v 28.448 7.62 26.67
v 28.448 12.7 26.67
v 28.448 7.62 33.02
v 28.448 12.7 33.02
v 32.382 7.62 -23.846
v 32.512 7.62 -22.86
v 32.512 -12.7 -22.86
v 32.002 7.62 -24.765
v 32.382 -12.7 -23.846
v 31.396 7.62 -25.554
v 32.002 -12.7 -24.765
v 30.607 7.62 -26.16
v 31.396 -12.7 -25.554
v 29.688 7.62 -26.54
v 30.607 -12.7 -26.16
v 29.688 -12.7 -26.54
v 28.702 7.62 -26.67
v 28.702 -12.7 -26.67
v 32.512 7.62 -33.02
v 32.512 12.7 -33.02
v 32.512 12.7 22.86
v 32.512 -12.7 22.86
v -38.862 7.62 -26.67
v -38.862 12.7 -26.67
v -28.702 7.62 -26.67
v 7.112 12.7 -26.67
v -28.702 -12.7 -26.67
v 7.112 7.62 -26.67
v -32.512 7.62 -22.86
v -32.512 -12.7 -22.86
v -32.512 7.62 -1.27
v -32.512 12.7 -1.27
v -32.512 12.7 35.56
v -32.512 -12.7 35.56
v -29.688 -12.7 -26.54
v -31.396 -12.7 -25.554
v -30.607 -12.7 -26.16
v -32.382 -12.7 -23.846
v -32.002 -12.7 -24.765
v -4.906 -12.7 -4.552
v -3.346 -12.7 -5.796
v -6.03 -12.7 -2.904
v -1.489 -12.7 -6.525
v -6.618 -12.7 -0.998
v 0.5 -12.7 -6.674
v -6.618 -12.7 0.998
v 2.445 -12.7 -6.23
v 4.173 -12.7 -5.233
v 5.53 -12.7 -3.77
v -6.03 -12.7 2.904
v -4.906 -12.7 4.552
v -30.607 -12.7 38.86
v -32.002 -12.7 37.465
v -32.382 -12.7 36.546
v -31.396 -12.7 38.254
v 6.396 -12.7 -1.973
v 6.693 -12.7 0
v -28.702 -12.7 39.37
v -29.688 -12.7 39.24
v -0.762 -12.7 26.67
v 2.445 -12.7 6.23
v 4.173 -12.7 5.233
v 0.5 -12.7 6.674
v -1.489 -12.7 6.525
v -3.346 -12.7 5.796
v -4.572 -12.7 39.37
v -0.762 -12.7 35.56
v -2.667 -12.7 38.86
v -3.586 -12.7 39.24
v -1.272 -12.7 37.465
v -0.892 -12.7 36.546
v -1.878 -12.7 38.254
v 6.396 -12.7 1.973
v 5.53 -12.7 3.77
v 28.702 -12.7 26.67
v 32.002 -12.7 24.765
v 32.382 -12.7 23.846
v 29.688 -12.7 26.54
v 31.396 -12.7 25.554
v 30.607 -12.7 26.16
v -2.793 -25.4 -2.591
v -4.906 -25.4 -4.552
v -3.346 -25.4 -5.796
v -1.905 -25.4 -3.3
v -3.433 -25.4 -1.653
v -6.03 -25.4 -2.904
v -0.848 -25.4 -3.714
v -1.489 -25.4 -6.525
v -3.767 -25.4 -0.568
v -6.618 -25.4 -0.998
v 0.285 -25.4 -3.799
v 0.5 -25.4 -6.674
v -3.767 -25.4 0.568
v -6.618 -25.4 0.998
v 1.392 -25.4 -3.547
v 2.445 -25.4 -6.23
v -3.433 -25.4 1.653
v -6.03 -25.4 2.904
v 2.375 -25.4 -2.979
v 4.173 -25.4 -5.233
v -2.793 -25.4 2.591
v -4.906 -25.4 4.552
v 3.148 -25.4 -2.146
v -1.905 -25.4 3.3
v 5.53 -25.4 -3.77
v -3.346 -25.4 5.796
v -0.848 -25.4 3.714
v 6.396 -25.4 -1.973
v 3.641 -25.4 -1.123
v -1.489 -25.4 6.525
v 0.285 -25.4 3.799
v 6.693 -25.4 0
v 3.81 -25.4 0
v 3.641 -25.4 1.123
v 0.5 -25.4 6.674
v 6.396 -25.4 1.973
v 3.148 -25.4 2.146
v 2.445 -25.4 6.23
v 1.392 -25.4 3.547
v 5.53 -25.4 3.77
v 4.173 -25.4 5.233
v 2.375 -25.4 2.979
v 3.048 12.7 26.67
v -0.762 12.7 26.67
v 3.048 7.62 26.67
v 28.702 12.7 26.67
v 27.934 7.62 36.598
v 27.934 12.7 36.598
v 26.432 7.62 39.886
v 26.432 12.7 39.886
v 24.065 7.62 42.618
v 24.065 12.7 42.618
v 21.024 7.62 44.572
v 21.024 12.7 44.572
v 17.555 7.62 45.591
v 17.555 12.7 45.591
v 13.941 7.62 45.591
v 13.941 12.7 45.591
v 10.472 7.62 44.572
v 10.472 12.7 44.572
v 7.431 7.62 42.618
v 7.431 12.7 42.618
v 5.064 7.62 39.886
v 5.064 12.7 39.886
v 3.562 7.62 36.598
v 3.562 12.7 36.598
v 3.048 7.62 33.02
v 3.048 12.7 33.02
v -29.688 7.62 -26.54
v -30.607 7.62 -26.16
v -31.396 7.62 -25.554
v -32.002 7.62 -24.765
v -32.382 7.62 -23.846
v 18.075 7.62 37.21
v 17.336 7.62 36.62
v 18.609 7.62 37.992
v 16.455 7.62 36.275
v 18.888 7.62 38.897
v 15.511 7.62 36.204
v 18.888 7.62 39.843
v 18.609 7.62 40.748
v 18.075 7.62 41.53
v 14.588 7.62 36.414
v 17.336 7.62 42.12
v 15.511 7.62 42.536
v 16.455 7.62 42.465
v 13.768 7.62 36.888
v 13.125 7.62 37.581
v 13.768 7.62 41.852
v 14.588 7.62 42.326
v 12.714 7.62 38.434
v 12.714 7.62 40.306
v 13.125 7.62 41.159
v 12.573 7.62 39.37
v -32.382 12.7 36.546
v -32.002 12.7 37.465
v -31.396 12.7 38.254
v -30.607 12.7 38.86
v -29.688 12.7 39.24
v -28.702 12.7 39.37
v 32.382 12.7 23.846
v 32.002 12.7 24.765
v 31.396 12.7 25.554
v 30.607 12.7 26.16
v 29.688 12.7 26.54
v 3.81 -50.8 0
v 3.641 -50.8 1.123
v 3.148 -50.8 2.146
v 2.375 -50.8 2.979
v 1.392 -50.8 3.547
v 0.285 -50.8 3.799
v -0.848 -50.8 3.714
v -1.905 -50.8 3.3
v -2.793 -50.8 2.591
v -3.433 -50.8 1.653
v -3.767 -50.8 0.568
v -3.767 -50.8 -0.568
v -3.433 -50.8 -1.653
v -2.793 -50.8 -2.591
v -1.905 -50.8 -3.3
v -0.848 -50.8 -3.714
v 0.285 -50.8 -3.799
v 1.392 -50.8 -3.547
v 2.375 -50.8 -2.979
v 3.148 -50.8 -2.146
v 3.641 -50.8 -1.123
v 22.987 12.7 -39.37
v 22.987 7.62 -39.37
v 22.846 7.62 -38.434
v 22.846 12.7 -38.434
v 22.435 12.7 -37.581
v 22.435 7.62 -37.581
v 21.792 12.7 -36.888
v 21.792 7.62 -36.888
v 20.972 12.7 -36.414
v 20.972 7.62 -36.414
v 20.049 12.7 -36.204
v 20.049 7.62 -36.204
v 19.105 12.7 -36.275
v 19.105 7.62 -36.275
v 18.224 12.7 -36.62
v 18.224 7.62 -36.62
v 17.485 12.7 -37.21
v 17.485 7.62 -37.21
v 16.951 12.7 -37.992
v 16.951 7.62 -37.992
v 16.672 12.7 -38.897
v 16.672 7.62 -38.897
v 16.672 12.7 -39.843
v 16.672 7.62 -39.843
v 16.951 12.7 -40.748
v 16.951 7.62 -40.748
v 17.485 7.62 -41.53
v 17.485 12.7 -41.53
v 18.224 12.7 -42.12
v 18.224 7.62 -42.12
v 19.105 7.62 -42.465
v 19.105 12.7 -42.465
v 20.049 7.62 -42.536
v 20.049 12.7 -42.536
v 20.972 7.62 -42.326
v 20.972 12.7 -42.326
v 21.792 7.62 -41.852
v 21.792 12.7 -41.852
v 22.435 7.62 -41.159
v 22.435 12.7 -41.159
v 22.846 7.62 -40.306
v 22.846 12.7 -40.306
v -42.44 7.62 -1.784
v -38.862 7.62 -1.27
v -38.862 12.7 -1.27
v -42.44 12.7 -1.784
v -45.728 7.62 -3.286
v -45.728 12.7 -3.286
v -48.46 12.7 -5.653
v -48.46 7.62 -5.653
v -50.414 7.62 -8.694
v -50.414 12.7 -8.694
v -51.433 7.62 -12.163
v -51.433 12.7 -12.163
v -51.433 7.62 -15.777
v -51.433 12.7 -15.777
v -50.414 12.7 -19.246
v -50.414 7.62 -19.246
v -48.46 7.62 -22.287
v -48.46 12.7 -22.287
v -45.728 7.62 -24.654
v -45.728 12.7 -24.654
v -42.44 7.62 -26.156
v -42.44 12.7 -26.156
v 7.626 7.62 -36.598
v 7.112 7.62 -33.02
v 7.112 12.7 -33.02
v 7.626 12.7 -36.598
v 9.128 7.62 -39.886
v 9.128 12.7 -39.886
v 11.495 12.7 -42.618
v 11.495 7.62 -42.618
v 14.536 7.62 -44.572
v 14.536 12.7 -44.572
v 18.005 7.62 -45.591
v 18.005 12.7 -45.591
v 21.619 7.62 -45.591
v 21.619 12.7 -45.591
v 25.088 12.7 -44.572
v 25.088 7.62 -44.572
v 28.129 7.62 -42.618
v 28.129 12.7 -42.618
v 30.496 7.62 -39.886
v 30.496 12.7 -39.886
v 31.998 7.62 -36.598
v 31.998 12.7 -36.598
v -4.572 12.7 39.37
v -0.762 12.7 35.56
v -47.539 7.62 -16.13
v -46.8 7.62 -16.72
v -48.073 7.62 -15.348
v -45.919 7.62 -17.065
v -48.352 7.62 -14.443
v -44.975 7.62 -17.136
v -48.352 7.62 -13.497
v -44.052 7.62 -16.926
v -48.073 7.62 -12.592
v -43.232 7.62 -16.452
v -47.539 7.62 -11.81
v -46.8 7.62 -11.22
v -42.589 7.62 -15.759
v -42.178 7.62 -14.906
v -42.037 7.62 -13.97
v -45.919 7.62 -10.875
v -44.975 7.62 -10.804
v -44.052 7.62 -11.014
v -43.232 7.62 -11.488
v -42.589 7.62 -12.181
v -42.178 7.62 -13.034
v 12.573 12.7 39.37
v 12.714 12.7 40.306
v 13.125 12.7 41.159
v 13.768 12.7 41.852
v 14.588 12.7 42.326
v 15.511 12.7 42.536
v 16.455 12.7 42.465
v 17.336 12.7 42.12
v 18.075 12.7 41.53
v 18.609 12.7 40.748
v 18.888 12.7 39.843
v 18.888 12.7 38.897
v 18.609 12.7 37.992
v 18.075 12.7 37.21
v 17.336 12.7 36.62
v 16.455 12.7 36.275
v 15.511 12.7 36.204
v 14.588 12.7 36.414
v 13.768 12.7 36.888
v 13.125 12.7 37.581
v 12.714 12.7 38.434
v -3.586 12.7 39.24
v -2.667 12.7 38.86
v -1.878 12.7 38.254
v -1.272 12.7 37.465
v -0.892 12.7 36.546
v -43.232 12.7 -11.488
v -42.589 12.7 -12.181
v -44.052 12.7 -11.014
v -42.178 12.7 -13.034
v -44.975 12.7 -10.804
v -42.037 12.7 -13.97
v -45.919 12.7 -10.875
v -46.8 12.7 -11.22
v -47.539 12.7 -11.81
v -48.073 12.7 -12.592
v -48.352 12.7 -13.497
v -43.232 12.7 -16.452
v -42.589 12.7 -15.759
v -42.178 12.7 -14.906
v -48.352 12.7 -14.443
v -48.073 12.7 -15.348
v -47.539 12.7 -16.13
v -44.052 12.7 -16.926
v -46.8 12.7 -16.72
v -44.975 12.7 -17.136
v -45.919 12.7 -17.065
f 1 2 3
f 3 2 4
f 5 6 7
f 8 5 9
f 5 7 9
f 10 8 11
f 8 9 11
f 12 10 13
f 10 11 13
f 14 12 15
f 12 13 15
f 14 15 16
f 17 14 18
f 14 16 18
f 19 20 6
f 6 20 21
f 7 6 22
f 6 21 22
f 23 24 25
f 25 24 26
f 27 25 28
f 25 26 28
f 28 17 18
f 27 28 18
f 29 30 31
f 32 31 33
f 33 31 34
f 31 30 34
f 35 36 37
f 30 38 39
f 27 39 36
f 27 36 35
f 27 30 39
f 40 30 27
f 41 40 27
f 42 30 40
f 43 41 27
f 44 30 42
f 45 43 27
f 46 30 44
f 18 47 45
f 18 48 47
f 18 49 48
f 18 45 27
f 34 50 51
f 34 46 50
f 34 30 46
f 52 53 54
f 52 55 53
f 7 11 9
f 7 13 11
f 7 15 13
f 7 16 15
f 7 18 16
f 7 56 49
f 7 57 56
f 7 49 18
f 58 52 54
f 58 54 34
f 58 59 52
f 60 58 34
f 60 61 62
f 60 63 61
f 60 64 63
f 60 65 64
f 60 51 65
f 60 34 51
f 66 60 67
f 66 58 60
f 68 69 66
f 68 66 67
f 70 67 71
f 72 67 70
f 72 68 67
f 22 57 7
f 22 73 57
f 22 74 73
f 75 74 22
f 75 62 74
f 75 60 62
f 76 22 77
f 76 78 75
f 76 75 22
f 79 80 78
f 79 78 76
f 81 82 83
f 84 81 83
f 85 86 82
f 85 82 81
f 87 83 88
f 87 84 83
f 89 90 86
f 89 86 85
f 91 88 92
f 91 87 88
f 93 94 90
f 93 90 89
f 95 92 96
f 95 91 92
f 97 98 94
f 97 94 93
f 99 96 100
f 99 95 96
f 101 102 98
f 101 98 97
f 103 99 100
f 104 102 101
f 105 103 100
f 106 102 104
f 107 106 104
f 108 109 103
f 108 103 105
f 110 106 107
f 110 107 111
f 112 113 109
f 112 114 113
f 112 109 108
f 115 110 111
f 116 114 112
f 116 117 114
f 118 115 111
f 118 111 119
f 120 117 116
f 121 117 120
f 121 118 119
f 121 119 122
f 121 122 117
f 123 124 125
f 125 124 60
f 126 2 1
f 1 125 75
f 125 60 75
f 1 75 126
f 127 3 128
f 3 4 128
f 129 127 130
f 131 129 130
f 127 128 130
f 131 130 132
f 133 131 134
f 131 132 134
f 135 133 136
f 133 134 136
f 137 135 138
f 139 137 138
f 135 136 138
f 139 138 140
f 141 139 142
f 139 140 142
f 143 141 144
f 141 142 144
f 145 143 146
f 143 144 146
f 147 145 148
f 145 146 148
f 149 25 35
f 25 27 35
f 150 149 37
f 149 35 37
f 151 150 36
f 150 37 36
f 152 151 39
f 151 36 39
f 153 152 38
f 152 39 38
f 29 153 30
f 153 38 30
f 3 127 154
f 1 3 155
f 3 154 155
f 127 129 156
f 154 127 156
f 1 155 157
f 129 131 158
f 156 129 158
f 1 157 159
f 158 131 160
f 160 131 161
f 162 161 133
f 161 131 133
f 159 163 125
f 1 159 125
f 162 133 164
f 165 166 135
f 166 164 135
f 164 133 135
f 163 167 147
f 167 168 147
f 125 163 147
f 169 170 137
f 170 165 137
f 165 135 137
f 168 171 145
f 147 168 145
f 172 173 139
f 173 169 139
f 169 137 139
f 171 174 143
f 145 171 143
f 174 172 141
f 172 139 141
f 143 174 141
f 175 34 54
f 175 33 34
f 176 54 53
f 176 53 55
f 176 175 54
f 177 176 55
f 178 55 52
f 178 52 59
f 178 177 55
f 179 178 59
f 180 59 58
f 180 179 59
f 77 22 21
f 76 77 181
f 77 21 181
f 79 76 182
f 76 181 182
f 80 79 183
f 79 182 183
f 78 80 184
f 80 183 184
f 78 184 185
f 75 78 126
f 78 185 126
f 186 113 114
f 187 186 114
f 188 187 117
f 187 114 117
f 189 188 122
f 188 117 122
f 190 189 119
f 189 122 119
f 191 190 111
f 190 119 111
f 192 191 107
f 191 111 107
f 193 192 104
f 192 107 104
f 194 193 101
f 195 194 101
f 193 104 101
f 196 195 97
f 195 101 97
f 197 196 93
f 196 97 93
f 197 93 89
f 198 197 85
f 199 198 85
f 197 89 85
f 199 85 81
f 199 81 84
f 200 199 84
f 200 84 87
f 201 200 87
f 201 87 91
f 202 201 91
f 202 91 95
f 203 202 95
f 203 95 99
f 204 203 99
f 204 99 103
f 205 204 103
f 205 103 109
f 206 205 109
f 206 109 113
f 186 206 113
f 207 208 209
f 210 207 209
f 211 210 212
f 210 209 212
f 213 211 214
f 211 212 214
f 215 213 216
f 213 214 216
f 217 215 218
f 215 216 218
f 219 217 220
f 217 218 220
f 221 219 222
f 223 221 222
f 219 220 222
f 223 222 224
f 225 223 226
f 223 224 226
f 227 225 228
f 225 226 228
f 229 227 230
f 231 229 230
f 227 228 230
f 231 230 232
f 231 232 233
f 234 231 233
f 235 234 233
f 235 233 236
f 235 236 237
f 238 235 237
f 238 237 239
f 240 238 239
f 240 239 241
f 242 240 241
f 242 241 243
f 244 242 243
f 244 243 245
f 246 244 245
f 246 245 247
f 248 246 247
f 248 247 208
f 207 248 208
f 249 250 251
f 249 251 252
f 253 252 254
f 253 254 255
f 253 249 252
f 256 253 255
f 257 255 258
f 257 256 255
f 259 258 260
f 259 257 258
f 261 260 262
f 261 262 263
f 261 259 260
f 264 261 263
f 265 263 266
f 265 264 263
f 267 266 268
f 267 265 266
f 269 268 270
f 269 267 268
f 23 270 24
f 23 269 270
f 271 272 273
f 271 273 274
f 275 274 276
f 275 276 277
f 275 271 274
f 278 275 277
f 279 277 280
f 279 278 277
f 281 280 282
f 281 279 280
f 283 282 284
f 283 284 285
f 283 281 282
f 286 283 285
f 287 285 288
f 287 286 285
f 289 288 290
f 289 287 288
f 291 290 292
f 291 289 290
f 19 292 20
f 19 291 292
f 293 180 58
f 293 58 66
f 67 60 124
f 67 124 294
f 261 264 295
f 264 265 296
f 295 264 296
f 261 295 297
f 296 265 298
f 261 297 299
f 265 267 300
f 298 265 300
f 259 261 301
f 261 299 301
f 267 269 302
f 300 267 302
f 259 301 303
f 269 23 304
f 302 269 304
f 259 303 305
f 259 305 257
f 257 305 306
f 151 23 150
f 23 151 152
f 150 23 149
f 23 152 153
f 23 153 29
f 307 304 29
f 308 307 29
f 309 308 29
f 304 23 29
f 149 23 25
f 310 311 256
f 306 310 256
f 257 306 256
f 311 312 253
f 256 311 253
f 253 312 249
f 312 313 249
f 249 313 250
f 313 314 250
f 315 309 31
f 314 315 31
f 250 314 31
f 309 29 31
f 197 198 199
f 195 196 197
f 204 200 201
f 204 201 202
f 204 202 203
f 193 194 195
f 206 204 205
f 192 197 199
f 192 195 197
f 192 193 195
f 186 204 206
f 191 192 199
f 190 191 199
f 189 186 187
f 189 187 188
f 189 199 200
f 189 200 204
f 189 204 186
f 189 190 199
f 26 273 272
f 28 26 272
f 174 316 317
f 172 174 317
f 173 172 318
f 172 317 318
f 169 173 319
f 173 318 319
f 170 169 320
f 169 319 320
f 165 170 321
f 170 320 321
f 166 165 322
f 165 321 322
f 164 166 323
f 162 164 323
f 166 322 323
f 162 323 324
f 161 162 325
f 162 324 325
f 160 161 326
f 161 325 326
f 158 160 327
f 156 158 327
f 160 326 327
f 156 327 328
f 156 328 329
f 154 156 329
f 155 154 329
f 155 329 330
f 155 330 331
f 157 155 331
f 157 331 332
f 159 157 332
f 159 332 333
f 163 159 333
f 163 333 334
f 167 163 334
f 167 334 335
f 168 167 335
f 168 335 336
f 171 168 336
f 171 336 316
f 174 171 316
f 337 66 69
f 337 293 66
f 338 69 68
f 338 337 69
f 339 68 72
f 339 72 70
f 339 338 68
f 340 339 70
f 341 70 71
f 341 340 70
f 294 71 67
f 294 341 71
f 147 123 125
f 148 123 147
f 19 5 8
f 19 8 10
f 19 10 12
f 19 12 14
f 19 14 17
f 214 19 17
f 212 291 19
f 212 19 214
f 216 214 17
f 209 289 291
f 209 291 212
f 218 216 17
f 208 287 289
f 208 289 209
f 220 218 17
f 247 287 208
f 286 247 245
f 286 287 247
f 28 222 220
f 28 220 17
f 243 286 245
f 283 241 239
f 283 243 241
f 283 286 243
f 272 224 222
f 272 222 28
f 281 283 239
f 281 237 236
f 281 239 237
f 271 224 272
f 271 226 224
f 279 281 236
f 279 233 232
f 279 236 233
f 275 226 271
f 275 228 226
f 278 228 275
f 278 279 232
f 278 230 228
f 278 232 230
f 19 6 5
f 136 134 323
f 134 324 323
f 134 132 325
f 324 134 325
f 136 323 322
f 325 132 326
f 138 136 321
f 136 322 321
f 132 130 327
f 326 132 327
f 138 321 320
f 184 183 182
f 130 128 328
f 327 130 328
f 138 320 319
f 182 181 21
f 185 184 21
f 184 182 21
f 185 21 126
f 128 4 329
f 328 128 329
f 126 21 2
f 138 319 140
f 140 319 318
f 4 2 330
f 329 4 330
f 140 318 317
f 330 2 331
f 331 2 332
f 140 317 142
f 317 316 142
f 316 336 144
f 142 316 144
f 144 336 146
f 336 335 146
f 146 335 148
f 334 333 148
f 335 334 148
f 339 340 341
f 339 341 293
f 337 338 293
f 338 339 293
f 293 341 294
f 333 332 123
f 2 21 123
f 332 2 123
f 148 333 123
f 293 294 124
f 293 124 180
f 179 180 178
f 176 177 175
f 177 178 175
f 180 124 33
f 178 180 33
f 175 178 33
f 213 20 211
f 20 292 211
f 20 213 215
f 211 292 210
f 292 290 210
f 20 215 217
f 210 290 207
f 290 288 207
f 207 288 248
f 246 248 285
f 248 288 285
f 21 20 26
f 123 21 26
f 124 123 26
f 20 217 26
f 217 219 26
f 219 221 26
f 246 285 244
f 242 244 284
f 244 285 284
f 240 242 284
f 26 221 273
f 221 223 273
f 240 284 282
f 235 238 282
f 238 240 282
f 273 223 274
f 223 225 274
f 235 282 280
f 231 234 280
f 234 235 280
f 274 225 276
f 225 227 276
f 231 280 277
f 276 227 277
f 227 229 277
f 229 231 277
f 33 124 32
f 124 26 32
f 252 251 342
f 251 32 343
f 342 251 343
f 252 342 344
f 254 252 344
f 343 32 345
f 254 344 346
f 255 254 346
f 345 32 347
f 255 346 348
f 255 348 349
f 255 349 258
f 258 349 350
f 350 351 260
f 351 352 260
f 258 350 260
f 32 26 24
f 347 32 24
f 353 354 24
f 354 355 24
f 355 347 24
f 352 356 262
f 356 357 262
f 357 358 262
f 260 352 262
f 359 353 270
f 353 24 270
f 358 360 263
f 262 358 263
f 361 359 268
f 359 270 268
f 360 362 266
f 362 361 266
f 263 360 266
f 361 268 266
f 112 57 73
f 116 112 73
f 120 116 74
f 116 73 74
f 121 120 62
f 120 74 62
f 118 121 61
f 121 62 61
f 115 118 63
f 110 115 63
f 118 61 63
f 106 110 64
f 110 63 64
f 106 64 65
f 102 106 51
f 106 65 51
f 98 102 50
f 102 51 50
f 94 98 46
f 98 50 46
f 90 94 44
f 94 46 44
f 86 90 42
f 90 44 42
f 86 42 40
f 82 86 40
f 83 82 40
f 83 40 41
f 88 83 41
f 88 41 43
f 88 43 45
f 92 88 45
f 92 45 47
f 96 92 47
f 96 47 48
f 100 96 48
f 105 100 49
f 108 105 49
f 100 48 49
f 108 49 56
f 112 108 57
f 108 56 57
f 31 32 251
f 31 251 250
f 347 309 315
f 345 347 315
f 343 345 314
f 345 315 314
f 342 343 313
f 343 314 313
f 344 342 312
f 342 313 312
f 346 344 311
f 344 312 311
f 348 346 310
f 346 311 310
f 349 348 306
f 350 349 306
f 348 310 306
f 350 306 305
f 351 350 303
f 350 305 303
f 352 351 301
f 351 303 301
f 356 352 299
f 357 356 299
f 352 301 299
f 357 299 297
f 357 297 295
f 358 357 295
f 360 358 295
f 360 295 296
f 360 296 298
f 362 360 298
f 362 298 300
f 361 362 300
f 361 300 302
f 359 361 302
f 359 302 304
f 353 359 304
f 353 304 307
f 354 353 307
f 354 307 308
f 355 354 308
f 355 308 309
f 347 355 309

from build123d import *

# Parameters (mm, degrees)
F0_W          = 65.024
F0_H          = 53.34
F1_DEPTH      = 12.7
F1_DEPTH_BACK = 12.7
F2_W          = 31.75
F2_H          = 12.7
F3_DEPTH      = 25.4
F4_W          = 25.4
F4_H          = 6.35
F5_DEPTH      = 5.08
F7_W          = 12.7
F7_H          = 5.08
F8_ANGLE      = 180
F9_R          = 3.175
F10_DEPTH     = 25.4
F11_W         = 5.08
F11_H         = 25.4
F12_DEPTH     = 6.35
F13_W         = 5.08
F13_H         = 12.7
F15_R         = 3.175
F16_DEPTH     = 25.4
F17_W         = 25.4
F17_H         = 5.08
F18_DEPTH     = 6.35
F19_W         = 12.7
F19_H         = 5.08
F21_R         = 3.175
F22_DEPTH     = 25.4
F23_R         = 3.81
F24_R         = 6.6929
F24_R_2       = 2.54
F25_DEPTH     = 12.7
F26_R         = 3.81
F27_DEPTH     = 38.1


with BuildPart() as f1:
    # F0 (on Front) → F1 (new body, two sides)
    with BuildSketch(Plane.XZ) as f1_sk:
        Rectangle(F0_W, F0_H)
    extrude(amount=F1_DEPTH)
    extrude(f1_sk.sketch, amount=-F1_DEPTH_BACK)

    # F2 (on face) → F3 (join)
    with BuildSketch(Plane.XZ.offset(12.7)):
        with Locations((-16.637, 33.02)):
            Rectangle(F2_W, F2_H)
    extrude(amount=-F3_DEPTH)

    # F4 (on face) → F5 (join)
    with BuildSketch(Plane(origin=(0, 12.7, 0), x_dir=(-1, 0, 0), z_dir=(0, 1, 0))):
        with Locations((-15.748, 29.845)):
            Rectangle(F4_W, F4_H)
    extrude(amount=-F5_DEPTH)

    # F7 (on face) → F8 (revolve)
    with BuildSketch(Plane.XY.offset(33.02)):
        with Locations((22.098, 10.16)):
            Rectangle(F7_W, F7_H)
    revolve(axis=Axis((15.748, 10.16, 33.02), (0, -1, 0)), revolution_arc=F8_ANGLE)

    # F9 (on face) → F10 (cut)
    with BuildSketch(Plane(origin=(0, 12.7, 0), x_dir=(-1, 0, 0), z_dir=(0, 1, 0))):
        with Locations((-15.748, 39.37)):
            Circle(F9_R)
    extrude(amount=-F10_DEPTH, mode=Mode.SUBTRACT)

    # F11 (on face) → F12 (join)
    with BuildSketch(Plane(origin=(-32.512, 0, 0), x_dir=(0, -1, 0), z_dir=(-1, 0, 0))):
        with Locations((-10.16, -13.97)):
            Rectangle(F11_W, F11_H)
    extrude(amount=F12_DEPTH)

    # F13 (on face) → F14 (revolve)
    with BuildSketch(Plane(origin=(-38.862, 0, 0), x_dir=(0, -1, 0), z_dir=(-1, 0, 0))):
        with Locations((-10.16, -7.62)):
            Rectangle(F13_W, F13_H)
    revolve(axis=Axis((-38.862, 10.16, -13.97), (0, -1, 0)))

    # F15 (on face) → F16 (cut)
    with BuildSketch(Plane.XZ.offset(-7.62)):
        with Locations((-45.212, -13.97)):
            Circle(F15_R)
    extrude(amount=-F16_DEPTH, mode=Mode.SUBTRACT)

    # F17 (on face) → F18 (join)
    with BuildSketch(Plane(origin=(0, 0, -26.67), x_dir=(1, 0, 0), z_dir=(0, 0, -1))):
        with Locations((19.812, -10.16)):
            Rectangle(F17_W, F17_H)
    extrude(amount=F18_DEPTH)

    # F19 (on face) → F20 (revolve)
    with BuildSketch(Plane(origin=(0, 0, -33.02), x_dir=(1, 0, 0), z_dir=(0, 0, -1))):
        with Locations((13.462, -10.16)):
            Rectangle(F19_W, F19_H)
    revolve(axis=Axis((19.812, 10.16, -33.02), (0, -1, 0)))

    # F21 (on face) → F22 (cut)
    with BuildSketch(Plane.XZ.offset(-7.62)):
        with Locations((19.812, -39.37)):
            Circle(F21_R)
    extrude(amount=-F22_DEPTH, mode=Mode.SUBTRACT)

    # F23
    f23_edges = [f1.edges().sort_by_distance(p)[0] for p in [
        (-0.762, 0, 39.37),
        (-32.512, 0, 39.37),
        (32.512, 0, 26.67),
        (32.512, -2.54, -26.67),
        (-32.512, -2.54, -26.67),
    ]]
    fillet(f23_edges, radius=F23_R)

    # F24 (on face) → F25 (join)
    with BuildSketch(Plane.XZ.offset(12.7)):
        Circle(F24_R)
        Circle(F24_R_2, mode=Mode.SUBTRACT)
    extrude(amount=F25_DEPTH)

    # F26 (on face) → F27 (join)
    with BuildSketch(Plane.XZ.offset(12.7)):
        Circle(F26_R)
    extrude(amount=F27_DEPTH)


solid = f1.part
